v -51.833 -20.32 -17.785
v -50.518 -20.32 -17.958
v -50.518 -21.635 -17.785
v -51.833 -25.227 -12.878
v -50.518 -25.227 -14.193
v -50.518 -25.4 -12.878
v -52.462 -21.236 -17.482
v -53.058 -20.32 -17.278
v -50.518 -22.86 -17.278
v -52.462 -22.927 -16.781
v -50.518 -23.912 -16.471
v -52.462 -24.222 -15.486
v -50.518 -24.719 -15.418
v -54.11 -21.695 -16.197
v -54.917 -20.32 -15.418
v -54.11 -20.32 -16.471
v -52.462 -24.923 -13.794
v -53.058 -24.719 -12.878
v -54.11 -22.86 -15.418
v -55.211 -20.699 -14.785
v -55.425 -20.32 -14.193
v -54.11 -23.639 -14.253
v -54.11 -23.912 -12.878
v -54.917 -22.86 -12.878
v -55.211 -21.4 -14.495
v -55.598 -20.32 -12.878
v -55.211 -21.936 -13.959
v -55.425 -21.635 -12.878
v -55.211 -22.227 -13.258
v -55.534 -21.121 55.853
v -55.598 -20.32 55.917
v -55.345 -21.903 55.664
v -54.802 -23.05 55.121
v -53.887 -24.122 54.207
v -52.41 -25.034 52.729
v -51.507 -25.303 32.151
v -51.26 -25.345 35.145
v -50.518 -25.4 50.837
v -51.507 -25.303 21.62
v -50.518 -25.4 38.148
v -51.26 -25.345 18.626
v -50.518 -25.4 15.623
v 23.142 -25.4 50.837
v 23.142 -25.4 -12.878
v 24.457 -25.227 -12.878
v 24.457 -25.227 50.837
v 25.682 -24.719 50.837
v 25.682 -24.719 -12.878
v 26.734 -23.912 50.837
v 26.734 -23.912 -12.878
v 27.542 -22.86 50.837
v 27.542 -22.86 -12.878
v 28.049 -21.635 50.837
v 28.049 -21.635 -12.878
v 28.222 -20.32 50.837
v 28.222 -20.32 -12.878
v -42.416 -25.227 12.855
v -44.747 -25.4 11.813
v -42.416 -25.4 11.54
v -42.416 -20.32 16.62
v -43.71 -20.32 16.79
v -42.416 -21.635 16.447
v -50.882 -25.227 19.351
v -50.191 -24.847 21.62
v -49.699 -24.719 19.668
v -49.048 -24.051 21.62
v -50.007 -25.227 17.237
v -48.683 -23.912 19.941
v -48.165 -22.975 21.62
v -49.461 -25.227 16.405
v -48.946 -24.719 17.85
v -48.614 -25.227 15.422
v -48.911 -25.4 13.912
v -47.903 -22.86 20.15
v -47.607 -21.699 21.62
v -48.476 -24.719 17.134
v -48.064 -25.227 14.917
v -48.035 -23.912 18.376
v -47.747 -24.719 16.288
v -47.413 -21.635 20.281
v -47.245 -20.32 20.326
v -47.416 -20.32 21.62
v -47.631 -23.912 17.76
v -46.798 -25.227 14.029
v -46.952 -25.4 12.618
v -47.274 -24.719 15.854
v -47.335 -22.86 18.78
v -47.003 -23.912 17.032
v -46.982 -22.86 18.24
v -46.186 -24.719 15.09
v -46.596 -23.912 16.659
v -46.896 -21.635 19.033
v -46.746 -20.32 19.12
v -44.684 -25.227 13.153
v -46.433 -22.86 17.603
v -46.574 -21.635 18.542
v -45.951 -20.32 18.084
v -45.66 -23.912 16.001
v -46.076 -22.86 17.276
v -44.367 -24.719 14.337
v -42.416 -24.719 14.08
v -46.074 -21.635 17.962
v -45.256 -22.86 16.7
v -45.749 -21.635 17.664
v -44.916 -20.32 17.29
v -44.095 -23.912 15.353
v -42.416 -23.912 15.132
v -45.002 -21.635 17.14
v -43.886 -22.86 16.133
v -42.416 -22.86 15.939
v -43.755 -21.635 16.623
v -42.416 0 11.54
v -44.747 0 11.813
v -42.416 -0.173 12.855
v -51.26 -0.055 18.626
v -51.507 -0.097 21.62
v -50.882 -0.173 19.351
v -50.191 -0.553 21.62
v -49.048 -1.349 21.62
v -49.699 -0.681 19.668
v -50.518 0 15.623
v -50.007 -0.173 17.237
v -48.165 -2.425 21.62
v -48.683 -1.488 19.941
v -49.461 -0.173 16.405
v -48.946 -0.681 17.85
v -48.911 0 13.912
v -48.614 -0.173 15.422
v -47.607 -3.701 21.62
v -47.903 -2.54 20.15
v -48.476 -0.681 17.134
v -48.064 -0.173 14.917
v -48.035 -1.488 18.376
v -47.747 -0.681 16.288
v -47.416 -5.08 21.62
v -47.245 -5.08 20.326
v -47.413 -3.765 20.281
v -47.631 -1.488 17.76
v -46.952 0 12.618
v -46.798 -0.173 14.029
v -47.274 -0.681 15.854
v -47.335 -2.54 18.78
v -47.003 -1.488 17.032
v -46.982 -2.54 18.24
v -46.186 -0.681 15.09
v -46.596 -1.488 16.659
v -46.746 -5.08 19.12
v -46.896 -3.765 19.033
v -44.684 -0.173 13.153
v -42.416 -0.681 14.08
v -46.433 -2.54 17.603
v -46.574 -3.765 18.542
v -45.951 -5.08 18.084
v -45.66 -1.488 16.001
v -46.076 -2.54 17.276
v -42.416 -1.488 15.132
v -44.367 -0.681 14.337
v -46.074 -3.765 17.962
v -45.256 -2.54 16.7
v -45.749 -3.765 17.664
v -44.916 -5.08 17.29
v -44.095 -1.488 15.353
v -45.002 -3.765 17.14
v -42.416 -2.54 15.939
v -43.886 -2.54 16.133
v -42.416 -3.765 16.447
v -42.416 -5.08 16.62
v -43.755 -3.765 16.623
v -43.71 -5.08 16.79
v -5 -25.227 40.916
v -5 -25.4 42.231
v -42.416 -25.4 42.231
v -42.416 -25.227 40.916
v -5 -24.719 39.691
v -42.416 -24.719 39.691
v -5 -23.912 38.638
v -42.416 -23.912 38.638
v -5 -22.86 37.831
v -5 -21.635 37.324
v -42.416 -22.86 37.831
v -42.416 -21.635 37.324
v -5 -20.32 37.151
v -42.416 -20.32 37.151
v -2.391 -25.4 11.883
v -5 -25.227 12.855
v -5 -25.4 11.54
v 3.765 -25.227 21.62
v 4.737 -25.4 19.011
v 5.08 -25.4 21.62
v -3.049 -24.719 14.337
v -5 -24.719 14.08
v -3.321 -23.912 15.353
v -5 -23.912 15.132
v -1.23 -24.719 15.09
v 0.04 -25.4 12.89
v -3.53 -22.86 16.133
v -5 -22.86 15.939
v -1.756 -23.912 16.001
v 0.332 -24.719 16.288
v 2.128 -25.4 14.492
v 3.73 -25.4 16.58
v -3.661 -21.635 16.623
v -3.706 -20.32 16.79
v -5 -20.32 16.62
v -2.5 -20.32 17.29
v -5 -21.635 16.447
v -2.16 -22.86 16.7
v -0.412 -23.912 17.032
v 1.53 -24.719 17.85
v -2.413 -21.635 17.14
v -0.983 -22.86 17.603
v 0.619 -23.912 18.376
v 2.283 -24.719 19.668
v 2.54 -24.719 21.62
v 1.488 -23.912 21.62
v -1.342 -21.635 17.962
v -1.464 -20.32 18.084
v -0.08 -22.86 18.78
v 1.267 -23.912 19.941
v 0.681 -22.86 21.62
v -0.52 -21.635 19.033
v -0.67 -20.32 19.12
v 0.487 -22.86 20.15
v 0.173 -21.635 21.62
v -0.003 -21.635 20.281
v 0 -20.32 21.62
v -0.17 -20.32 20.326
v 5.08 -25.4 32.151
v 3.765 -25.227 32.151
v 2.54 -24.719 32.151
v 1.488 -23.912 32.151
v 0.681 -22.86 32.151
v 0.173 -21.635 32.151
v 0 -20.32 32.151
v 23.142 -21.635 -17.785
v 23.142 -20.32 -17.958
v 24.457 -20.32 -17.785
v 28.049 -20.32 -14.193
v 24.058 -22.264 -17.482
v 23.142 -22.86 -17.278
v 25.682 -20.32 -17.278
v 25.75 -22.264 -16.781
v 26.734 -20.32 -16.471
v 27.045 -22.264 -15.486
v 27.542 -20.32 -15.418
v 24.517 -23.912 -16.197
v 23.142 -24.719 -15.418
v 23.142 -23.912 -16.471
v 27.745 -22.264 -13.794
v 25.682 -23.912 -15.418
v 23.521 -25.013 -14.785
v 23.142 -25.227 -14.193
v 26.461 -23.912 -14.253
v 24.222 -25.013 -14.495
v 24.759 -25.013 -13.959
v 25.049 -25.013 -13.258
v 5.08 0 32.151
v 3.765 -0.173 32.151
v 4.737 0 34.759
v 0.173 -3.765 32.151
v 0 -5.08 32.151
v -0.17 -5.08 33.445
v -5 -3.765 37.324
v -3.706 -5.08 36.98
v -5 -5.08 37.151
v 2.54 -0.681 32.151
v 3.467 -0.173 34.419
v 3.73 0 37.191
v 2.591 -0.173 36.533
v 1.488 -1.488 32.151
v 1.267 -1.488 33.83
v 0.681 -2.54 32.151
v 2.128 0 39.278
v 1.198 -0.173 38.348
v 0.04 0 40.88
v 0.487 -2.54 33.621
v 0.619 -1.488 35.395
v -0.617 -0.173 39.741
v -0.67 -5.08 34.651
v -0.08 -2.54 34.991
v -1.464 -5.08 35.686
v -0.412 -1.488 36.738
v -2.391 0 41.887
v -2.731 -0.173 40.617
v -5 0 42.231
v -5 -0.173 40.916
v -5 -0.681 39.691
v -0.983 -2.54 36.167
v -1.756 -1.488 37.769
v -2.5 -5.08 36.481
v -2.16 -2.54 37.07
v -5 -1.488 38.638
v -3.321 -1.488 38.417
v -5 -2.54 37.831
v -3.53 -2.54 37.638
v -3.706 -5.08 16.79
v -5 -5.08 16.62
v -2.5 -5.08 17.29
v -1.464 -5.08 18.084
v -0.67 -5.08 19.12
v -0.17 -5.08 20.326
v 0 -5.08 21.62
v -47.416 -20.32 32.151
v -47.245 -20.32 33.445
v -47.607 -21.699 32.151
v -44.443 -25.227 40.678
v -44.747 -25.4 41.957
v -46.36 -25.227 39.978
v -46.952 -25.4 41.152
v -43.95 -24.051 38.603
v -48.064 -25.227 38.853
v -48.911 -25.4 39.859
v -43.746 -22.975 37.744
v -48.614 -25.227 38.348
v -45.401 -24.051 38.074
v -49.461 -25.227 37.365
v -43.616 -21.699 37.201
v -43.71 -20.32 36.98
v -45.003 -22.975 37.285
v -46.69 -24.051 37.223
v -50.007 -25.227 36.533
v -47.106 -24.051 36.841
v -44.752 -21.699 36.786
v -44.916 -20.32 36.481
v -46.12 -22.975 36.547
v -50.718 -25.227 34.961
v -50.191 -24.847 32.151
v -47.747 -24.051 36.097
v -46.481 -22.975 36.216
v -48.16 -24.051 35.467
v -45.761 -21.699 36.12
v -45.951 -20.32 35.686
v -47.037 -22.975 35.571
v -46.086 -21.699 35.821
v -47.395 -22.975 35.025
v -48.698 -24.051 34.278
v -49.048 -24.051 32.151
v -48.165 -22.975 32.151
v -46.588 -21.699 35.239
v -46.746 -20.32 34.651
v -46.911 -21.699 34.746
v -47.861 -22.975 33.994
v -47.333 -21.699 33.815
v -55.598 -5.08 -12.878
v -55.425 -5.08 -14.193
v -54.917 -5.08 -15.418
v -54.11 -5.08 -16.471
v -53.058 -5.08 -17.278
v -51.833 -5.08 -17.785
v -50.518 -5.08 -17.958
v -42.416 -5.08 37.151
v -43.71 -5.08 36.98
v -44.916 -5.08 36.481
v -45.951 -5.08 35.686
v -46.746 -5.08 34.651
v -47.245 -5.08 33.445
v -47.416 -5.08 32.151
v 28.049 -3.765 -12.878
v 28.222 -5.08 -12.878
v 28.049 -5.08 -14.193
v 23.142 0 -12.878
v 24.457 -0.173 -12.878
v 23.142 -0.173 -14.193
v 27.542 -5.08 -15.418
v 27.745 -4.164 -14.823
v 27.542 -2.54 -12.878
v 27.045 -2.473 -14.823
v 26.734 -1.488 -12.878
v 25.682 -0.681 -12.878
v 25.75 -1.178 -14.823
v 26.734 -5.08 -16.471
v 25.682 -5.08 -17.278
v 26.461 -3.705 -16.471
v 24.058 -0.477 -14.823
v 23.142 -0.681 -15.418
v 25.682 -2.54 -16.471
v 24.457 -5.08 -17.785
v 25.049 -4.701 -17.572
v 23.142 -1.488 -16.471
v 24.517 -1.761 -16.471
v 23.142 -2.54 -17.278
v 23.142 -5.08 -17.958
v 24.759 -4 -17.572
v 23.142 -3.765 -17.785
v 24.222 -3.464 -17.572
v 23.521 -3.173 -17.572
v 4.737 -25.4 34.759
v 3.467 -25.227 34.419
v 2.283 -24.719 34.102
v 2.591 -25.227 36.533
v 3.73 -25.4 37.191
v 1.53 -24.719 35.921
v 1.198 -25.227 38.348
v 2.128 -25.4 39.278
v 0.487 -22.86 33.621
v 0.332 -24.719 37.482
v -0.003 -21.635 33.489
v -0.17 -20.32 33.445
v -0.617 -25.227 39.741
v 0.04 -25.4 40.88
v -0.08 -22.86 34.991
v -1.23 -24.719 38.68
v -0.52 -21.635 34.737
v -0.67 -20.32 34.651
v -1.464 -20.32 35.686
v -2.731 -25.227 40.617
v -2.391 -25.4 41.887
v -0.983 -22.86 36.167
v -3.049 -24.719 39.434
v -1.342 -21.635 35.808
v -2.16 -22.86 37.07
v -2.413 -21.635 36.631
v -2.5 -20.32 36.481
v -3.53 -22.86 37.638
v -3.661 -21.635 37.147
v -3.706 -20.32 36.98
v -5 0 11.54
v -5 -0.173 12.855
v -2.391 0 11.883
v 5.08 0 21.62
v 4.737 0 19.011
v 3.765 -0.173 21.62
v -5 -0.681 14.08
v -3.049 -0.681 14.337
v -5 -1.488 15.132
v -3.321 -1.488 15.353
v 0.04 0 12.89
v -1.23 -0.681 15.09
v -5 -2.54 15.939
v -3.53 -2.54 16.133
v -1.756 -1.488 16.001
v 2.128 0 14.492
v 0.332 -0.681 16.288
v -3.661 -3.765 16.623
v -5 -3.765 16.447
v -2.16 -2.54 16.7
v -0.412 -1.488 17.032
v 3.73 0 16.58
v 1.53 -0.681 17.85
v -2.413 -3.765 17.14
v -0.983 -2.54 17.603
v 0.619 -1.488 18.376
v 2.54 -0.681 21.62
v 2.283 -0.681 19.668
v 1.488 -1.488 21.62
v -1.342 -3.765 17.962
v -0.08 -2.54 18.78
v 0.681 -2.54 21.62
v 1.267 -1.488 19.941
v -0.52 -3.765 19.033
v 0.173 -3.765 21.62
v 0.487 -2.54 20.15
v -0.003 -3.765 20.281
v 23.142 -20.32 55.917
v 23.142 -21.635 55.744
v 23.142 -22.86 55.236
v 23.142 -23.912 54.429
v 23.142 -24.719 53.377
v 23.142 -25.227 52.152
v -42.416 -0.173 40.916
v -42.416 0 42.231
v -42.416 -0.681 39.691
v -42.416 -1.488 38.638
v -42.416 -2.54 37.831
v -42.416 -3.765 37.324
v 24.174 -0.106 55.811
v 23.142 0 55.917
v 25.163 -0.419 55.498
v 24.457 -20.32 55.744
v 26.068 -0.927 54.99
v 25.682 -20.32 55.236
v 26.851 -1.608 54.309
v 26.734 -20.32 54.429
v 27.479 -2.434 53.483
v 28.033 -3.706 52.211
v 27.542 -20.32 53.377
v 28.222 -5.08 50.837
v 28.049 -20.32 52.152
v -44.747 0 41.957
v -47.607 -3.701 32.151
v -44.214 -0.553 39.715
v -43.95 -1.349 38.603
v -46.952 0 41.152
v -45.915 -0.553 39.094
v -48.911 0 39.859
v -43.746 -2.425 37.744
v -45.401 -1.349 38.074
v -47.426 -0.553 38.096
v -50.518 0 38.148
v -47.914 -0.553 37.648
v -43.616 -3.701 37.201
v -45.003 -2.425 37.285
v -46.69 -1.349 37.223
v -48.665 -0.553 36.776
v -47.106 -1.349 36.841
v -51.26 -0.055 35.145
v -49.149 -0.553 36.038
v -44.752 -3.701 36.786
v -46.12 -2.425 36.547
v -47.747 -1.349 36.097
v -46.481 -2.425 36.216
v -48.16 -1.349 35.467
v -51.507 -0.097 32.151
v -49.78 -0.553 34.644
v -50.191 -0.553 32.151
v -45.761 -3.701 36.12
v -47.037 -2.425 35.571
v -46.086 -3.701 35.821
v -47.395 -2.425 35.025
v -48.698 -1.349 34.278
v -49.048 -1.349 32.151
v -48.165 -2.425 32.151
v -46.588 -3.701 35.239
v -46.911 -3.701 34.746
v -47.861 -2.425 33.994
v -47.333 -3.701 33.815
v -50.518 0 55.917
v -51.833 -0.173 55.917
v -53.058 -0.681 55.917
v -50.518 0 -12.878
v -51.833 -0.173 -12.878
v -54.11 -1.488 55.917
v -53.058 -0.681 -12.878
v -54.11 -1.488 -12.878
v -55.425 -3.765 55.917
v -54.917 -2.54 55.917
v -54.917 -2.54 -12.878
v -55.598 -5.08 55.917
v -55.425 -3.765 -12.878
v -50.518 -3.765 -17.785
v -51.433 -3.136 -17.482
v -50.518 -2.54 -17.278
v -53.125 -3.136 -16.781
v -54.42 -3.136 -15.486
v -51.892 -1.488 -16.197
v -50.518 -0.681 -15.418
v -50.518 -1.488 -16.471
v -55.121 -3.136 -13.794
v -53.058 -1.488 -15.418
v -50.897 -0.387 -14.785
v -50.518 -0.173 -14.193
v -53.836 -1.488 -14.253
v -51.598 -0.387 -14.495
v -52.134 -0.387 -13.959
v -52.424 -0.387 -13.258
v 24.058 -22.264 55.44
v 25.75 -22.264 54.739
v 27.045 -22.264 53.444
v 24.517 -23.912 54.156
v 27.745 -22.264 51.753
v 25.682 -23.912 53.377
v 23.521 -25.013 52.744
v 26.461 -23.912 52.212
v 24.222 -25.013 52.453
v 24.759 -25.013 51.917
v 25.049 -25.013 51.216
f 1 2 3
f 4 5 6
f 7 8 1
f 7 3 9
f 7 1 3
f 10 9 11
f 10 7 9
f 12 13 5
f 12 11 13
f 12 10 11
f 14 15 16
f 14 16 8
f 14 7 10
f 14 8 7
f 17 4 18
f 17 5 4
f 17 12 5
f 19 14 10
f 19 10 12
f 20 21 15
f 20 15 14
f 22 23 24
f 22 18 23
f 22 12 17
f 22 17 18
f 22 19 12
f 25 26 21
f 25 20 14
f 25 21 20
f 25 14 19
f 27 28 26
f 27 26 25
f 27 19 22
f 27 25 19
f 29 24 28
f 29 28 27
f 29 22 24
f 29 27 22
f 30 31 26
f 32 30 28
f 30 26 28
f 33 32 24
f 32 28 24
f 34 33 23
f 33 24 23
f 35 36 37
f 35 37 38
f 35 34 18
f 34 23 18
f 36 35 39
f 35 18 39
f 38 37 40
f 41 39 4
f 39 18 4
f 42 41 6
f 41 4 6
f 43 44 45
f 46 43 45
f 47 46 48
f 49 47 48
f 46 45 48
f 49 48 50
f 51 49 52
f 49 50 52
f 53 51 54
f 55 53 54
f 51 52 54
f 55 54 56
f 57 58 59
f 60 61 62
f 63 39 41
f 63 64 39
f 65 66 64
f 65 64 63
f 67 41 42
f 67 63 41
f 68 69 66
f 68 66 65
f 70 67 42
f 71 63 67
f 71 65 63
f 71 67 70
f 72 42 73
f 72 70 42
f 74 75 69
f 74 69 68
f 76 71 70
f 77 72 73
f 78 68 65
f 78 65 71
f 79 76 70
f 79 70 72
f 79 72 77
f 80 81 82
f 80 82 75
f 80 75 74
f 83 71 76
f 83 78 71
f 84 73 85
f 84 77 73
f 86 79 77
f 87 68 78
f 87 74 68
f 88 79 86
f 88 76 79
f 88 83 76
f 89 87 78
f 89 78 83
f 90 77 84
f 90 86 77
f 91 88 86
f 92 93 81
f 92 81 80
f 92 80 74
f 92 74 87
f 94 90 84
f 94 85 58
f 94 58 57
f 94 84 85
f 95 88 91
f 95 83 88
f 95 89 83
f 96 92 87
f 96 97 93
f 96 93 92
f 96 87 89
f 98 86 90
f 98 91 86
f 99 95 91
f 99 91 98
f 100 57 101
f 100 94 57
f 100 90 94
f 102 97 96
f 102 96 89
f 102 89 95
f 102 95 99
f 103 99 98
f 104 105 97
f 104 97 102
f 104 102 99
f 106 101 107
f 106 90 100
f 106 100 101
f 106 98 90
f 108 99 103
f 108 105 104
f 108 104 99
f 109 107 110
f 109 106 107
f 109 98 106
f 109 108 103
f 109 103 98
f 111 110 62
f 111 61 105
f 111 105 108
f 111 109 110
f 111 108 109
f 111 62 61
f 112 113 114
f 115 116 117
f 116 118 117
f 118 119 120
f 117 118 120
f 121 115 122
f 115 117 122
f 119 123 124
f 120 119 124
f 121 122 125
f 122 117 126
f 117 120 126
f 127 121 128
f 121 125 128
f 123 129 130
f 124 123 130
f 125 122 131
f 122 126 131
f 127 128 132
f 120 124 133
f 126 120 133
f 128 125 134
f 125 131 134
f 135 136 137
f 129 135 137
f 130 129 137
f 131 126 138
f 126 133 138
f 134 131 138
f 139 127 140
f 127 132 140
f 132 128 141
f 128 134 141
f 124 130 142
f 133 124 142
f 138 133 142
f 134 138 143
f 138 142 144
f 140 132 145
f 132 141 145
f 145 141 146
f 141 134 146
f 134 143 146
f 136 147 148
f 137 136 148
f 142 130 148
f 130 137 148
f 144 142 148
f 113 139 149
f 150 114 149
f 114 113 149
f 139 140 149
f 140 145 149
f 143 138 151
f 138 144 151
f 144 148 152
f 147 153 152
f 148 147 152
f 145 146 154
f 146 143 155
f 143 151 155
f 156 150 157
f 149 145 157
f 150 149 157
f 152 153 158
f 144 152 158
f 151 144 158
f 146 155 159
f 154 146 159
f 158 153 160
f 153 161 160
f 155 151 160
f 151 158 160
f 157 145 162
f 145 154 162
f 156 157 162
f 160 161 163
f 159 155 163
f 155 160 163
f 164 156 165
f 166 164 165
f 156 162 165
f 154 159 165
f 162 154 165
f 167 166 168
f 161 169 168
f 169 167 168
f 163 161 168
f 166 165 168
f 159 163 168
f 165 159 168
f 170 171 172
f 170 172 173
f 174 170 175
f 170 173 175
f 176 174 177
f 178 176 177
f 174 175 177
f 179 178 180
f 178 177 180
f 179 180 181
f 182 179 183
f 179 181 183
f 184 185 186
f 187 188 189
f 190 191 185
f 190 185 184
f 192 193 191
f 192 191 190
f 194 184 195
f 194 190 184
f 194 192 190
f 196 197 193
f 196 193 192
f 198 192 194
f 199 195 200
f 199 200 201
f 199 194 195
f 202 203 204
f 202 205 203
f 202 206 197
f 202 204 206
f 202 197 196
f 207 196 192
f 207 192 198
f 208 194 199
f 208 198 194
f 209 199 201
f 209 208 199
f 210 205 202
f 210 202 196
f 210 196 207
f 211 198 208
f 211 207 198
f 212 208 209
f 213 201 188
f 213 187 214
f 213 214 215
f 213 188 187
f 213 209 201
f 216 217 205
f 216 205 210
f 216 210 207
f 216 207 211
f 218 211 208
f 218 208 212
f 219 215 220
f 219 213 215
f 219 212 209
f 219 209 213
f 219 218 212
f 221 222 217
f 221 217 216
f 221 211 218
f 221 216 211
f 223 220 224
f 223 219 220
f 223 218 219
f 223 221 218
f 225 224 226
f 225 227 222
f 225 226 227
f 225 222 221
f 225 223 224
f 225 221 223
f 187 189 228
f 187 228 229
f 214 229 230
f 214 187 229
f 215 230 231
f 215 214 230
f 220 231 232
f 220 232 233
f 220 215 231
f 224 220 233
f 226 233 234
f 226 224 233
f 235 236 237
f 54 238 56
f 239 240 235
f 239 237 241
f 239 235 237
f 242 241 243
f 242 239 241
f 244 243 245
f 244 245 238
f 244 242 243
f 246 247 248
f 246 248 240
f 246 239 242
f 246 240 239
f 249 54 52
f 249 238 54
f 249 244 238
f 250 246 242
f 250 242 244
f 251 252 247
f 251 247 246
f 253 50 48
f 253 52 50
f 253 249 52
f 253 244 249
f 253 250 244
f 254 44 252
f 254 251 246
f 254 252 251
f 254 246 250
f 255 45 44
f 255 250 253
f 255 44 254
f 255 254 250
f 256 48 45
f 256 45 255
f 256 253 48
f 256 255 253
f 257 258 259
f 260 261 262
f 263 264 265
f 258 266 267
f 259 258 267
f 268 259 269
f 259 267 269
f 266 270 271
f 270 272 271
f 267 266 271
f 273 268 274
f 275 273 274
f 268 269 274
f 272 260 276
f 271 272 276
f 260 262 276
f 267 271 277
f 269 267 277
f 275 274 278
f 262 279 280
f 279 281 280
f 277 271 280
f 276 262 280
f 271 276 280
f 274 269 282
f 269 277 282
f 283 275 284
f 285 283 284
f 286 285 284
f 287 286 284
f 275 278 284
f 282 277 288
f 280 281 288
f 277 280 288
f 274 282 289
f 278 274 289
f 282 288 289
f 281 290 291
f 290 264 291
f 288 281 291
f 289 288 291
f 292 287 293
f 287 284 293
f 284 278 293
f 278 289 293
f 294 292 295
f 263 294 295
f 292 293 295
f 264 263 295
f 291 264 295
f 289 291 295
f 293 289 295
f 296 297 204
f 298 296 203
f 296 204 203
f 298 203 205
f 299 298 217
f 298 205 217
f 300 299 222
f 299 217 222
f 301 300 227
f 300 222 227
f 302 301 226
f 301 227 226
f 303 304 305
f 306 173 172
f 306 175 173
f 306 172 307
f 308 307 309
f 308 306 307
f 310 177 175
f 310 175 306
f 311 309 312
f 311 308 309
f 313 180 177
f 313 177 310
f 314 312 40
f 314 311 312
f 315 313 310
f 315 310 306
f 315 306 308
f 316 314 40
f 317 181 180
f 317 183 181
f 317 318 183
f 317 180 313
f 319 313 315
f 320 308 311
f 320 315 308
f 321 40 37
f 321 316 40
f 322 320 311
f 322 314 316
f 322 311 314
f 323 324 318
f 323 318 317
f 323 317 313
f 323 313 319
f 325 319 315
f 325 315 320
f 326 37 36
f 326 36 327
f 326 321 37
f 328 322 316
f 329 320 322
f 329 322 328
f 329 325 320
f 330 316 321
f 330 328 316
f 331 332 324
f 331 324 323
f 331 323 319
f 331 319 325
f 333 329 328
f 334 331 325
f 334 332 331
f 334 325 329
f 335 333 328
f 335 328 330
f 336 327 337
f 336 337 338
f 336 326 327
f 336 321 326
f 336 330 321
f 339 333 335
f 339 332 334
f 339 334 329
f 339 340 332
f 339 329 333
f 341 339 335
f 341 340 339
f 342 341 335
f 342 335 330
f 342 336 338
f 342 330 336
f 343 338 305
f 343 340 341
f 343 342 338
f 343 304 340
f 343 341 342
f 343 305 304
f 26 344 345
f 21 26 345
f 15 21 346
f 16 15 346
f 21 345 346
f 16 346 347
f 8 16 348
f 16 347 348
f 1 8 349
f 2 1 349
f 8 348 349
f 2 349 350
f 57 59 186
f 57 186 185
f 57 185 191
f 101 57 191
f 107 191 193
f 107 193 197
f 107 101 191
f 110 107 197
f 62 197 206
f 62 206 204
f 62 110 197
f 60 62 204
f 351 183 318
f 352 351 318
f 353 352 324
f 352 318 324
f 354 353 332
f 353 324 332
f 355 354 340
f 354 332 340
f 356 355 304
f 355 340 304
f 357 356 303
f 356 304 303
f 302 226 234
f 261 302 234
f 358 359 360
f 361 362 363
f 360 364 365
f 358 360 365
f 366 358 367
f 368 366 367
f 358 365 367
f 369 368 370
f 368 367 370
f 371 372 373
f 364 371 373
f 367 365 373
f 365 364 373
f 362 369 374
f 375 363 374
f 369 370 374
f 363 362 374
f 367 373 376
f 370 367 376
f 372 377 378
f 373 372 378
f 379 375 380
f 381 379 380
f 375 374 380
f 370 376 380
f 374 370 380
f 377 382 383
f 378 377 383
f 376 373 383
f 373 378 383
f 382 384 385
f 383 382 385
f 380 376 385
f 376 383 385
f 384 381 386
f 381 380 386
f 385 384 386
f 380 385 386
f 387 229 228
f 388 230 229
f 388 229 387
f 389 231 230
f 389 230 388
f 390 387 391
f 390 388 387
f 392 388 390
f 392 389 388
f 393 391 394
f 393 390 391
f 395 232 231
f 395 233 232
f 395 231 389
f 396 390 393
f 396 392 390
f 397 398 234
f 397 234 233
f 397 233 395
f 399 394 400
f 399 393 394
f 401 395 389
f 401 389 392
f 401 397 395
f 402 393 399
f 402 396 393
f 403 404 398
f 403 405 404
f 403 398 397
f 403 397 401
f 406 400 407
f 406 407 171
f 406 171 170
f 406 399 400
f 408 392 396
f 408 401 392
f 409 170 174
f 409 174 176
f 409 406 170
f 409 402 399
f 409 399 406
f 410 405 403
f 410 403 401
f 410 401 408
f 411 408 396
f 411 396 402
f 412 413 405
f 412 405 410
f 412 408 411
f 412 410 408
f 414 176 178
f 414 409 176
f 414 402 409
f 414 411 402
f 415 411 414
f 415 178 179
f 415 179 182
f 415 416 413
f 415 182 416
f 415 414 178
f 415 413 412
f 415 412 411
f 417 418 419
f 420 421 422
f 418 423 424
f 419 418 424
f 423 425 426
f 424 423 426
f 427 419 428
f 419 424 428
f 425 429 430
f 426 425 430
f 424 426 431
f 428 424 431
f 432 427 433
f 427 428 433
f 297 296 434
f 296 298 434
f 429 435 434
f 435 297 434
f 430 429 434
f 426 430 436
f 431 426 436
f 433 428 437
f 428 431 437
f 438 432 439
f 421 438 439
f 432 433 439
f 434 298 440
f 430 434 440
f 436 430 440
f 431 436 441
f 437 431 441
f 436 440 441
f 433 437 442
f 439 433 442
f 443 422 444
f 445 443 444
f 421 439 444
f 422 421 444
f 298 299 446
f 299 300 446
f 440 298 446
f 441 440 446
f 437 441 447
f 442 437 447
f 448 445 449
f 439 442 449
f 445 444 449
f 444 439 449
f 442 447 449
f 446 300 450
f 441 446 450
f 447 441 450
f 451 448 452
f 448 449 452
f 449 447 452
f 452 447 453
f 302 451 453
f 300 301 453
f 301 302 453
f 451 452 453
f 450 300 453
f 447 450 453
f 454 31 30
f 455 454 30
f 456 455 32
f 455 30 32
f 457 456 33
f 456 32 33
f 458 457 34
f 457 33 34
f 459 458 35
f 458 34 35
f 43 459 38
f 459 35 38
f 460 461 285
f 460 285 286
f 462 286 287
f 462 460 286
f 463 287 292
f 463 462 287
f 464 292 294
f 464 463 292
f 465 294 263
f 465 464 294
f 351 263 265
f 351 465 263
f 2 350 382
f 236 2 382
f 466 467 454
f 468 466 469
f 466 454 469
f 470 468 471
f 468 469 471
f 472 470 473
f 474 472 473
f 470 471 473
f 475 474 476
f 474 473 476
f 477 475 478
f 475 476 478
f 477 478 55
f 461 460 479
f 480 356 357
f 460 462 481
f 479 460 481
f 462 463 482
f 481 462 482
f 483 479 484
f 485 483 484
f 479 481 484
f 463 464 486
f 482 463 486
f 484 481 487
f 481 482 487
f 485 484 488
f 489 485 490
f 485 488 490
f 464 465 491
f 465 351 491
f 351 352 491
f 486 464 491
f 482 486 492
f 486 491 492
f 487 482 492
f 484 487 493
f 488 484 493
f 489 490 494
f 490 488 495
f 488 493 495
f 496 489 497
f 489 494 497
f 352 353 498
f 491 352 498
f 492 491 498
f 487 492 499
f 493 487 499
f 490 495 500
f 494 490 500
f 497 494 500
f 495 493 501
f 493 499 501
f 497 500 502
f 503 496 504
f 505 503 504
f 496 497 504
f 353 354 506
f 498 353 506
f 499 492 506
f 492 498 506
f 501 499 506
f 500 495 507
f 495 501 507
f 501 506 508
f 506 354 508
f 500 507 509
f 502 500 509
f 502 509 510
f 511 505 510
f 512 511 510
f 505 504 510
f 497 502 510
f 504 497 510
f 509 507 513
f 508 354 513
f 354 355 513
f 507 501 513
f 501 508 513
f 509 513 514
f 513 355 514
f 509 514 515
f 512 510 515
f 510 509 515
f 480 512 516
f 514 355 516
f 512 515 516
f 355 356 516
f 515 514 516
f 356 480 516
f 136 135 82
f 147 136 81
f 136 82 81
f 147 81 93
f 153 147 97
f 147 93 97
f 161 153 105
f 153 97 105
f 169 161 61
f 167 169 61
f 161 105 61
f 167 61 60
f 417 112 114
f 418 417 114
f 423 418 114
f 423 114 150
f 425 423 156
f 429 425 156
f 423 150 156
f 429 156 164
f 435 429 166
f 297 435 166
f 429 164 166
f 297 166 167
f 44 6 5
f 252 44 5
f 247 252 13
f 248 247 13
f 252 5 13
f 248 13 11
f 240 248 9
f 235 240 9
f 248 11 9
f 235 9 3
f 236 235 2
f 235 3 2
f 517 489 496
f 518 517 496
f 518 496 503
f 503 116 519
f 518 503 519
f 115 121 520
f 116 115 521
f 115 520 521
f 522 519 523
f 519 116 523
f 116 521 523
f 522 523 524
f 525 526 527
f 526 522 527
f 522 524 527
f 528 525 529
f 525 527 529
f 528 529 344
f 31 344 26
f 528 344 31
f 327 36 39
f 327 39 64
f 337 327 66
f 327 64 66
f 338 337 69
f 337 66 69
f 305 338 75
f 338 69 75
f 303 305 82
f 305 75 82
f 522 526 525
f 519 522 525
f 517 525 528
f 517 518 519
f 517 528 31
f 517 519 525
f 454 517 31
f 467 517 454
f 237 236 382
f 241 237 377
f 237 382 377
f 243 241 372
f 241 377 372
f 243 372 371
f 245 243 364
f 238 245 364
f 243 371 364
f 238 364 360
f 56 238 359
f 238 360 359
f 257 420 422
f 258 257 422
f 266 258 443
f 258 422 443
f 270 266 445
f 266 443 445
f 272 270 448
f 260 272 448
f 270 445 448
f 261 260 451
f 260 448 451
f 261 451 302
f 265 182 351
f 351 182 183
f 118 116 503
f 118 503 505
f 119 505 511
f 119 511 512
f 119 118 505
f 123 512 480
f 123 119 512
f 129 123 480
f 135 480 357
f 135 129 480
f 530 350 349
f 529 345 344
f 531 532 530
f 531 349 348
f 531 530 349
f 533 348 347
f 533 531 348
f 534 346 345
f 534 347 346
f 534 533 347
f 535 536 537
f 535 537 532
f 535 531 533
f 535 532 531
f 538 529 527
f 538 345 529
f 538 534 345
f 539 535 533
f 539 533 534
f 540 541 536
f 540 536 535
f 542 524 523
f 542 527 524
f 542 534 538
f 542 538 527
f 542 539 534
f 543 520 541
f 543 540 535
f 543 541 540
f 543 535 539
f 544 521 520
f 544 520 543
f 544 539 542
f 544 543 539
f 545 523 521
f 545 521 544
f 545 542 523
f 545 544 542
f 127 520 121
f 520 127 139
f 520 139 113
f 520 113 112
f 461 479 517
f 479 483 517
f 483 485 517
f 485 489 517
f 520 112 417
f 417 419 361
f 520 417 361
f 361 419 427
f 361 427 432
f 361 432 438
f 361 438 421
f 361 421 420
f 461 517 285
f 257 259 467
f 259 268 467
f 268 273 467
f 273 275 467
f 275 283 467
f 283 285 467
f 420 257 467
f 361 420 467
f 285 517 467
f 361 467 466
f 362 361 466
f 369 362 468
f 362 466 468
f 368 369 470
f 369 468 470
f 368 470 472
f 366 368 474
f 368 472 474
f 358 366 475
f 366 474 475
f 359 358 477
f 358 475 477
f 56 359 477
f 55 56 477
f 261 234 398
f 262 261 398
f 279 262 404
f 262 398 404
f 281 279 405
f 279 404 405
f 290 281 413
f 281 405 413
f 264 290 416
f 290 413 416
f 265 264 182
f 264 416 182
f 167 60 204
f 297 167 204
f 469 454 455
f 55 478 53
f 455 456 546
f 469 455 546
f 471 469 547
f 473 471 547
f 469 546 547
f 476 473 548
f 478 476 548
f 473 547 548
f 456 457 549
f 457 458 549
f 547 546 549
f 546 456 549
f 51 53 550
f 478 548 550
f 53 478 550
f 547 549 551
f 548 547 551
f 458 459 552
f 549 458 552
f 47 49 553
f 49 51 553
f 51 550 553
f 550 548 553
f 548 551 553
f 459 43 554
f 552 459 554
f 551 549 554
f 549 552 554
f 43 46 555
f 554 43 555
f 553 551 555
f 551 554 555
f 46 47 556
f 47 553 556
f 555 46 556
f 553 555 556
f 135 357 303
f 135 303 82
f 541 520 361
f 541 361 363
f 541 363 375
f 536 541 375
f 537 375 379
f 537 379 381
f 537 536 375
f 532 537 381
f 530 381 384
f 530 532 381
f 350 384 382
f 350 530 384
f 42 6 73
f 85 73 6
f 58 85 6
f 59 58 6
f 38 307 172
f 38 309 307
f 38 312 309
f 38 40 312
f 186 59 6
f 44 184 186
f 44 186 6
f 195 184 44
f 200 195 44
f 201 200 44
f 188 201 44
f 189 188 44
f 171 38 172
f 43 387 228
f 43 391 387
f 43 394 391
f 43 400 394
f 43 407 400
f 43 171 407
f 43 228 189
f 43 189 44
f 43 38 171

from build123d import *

# Parameters (mm, degrees)
F0_W         = 83.8200002909
F0_H         = 73.8754719496
F1_DEPTH     = 25.4
F3_DEPTH     = 25.4
F4_R         = 5.08
F5_T1_DEPTH  = 63.7154719496
F5_T3_DEPTH  = 73.6600002909
F5_T5_DEPTH  = 81.4954719496
F5_T7_DEPTH  = 37.4158525467
F5_T9_DEPTH  = 15.24
F5_T11_DEPTH = 10.5305814743
F5_T13_DEPTH = 91.4400002909
F5_S17_W     = 5.08
F5_S17_H     = 5.08
F5_T18_DEPTH = 5.08
F5_S23_W     = 5.08
F5_S23_H     = 5.08
F5_T24_DEPTH = 5.08
F5_S29_W     = 5.08
F5_S29_H     = 5.08
F5_T30_DEPTH = 5.08
F5_T34_ANGLE = 90
F5_T36_ANGLE = 90
F5_T38_ANGLE = 90
F5_T40_ANGLE = 90
F5_T42_ANGLE = 90
F5_T44_ANGLE = 90
F5_T46_ANGLE = 90
F5_T48_ANGLE = 90
F5_T50_ANGLE = 90
F5_T52_ANGLE = 90


# Not quite as in the source:
# - a fillet or chamfer that OpenCascade refuses, or shapes differently, is made with other operations: its cross-section is extruded or revolved along the edge and cut away or added
# - a feature names something its author has since deleted; it is built from what else it names


with BuildPart() as f1:
    # F0 (on Front) → F1 (new body)
    with BuildSketch(Plane.XZ):
        with Locations((-13.6877670884, 18.9792513847)):
            Rectangle(F0_W, F0_H)
    extrude(amount=F1_DEPTH)

    # F2 (on face) → F3 (cut)
    with BuildSketch(Plane.XZ.offset(25.4)):
        with BuildLine():
            ThreePointArc((0, 32.1505618095), (-1.4644660941, 35.6860957155), (-5, 37.1505618095))
            Line((-5, 37.1505618095), (-42.4158525467, 37.1505618095))
            ThreePointArc((-42.4158525467, 37.1505618095), (-45.9513864526, 35.6860957155), (-47.4158525467, 32.1505618095))
            Line((-47.4158525467, 32.1505618095), (-47.4158525467, 21.6199803352))
            ThreePointArc((-47.4158525467, 21.6199803352), (-45.9513864526, 18.0844464293), (-42.4158525467, 16.6199803352))
            Line((-42.4158525467, 16.6199803352), (-5, 16.6199803352))
            ThreePointArc((-5, 16.6199803352), (-1.4644660941, 18.0844464293), (0, 21.6199803352))
            Line((0, 21.6199803352), (0, 32.1505618095))
        make_face()
    extrude(amount=-F3_DEPTH, mode=Mode.SUBTRACT)

    # F4
    f4_edges = [f1.edges().sort_by_distance(p)[0] for p in [
        (28.222233, 0, 18.979251),
        (28.222233, -12.7, 55.916987),
    ]]
    fillet(f4_edges, radius=F4_R)

    # F5: fillet of radius 5.08 on 10 edges, made by hand

    # F5_s2 → F5_t1 (cut)
    with BuildSketch(Plane.XY.offset(-12.8784845901)):
        with BuildLine():
            ThreePointArc((23.142233057, -25.4), (26.7343355054, -23.9121024484), (28.222233057, -20.32))
            Line((28.222233057, -20.32), (28.222233057, -25.4))
            Line((28.222233057, -25.4), (23.142233057, -25.4))
        make_face()
    extrude(amount=F5_T1_DEPTH, mode=Mode.SUBTRACT)

    # F5_s4 → F5_t3 (cut)
    with BuildSketch(Plane.YZ.offset(-50.5177672338)):
        with BuildLine():
            ThreePointArc((-25.4, -12.8784845901), (-23.9121024484, -16.4705870385), (-20.32, -17.9584845901))
            Line((-20.32, -17.9584845901), (-25.4, -17.9584845901))
            Line((-25.4, -17.9584845901), (-25.4, -12.8784845901))
        make_face()
        with BuildLine():
            ThreePointArc((0, -12.8784845901), (-1.4878975516, -16.4705870385), (-5.08, -17.9584845901))
            Line((-5.08, -17.9584845901), (0, -17.9584845901))
            Line((0, -17.9584845901), (0, -12.8784845901))
        make_face()
    extrude(amount=F5_T3_DEPTH, mode=Mode.SUBTRACT)

    # F5_s6 → F5_t5 (cut)
    with BuildSketch(Plane.XY.offset(-12.8784845901)):
        with BuildLine():
            ThreePointArc((-55.5977672338, -20.32), (-54.1098696823, -23.9121024484), (-50.5177672338, -25.4))
            Line((-50.5177672338, -25.4), (-55.5977672338, -25.4))
            Line((-55.5977672338, -25.4), (-55.5977672338, -20.32))
        make_face()
        with BuildLine():
            ThreePointArc((-50.5177672338, 0), (-54.1098696823, -1.4878975516), (-55.5977672338, -5.08))
            Line((-55.5977672338, -5.08), (-55.5977672338, 0))
            Line((-55.5977672338, 0), (-50.5177672338, 0))
        make_face()
    extrude(amount=F5_T5_DEPTH, mode=Mode.SUBTRACT)

    # F5_s8 → F5_t7 (cut)
    with BuildSketch(Plane.YZ.offset(-42.4158525467)):
        with BuildLine():
            ThreePointArc((-25.4, 42.2305618095), (-23.9121024484, 38.6384593611), (-20.32, 37.1505618095))
            Line((-20.32, 37.1505618095), (-25.4, 37.1505618095))
            Line((-25.4, 37.1505618095), (-25.4, 42.2305618095))
        make_face()
        with BuildLine():
            ThreePointArc((0, 11.5399803352), (-1.4878975516, 15.1320827837), (-5.08, 16.6199803352))
            Line((-5.08, 16.6199803352), (0, 16.6199803352))
            Line((0, 16.6199803352), (0, 11.5399803352))
        make_face()
        with BuildLine():
            ThreePointArc((0, 42.2305618095), (-1.4878975516, 38.6384593611), (-5.08, 37.1505618095))
            Line((-5.08, 37.1505618095), (0, 37.1505618095))
            Line((0, 37.1505618095), (0, 42.2305618095))
        make_face()
        with BuildLine():
            ThreePointArc((-25.4, 11.5399803352), (-23.9121024484, 15.1320827837), (-20.32, 16.6199803352))
            Line((-20.32, 16.6199803352), (-25.4, 16.6199803352))
            Line((-25.4, 16.6199803352), (-25.4, 11.5399803352))
        make_face()
    extrude(amount=F5_T7_DEPTH, mode=Mode.SUBTRACT)

    # F5_s10 → F5_t9 (cut)
    with BuildSketch(Plane.XZ.offset(5.08)):
        with BuildLine():
            ThreePointArc((-55.5977672338, -12.8784845901), (-54.1098696823, -16.4705870385), (-50.5177672338, -17.9584845901))
            Line((-50.5177672338, -17.9584845901), (-55.5977672338, -17.9584845901))
            Line((-55.5977672338, -17.9584845901), (-55.5977672338, -12.8784845901))
        make_face()
        with BuildLine():
            ThreePointArc((23.142233057, -17.9584845901), (26.7343355054, -16.4705870385), (28.222233057, -12.8784845901))
            Line((28.222233057, -12.8784845901), (28.222233057, -17.9584845901))
            Line((28.222233057, -17.9584845901), (23.142233057, -17.9584845901))
        make_face()
    extrude(amount=F5_T9_DEPTH, mode=Mode.SUBTRACT)

    # F5_s12 → F5_t11 (cut)
    with BuildSketch(Plane.XY.offset(21.6199803352)):
        with BuildLine():
            ThreePointArc((-52.4958525467, 0), (-48.9037500983, -1.4878975516), (-47.4158525467, -5.08))
            Line((-47.4158525467, -5.08), (-47.4158525467, 0))
            Line((-47.4158525467, 0), (-52.4958525467, 0))
        make_face()
        with BuildLine():
            ThreePointArc((5.08, 0), (1.4878975516, -1.4878975516), (0, -5.08))
            Line((0, -5.08), (0, 0))
            Line((0, 0), (5.08, 0))
        make_face()
        with BuildLine():
            ThreePointArc((5.08, -25.4), (1.4878975516, -23.9121024484), (0, -20.32))
            Line((0, -20.32), (0, -25.4))
            Line((0, -25.4), (5.08, -25.4))
        make_face()
        with BuildLine():
            ThreePointArc((-52.4958525467, -25.4), (-48.9037500983, -23.9121024484), (-47.4158525467, -20.32))
            Line((-47.4158525467, -20.32), (-47.4158525467, -25.4))
            Line((-47.4158525467, -25.4), (-52.4958525467, -25.4))
        make_face()
    extrude(amount=F5_T11_DEPTH, mode=Mode.SUBTRACT)

    # F5_s14 → F5_t13 (cut)
    with BuildSketch(Plane.YZ.offset(-68.2977672338)):
        with BuildLine():
            ThreePointArc((-20.32, 55.9169873595), (-23.9121024484, 54.429089808), (-25.4, 50.8369873595))
            Line((-25.4, 50.8369873595), (-25.4, 55.9169873595))
            Line((-25.4, 55.9169873595), (-20.32, 55.9169873595))
        make_face()
    extrude(amount=F5_T13_DEPTH, mode=Mode.SUBTRACT)


with BuildPart() as f5_tool16:
    # F5_s17 → F5_t18 (new body)
    with BuildSketch(Plane.XZ.offset(20.32)):
        with Locations((25.682233057, -15.4184845901)):
            Rectangle(F5_S17_W, F5_S17_H)
    extrude(amount=F5_T18_DEPTH)

    # F5_s19 → F5_t20 (revolve, cut)
    with BuildSketch(Plane(origin=(23.142233057, -20.32, -12.8784845901), x_dir=(-0.7071067812, 0, 0.7071067812), z_dir=(0.7071067812, 0, 0.7071067812))):
        with BuildLine():
            ThreePointArc((0, -5.08), (5.08, 0), (0, 5.08))
            Line((0, 5.08), (0, -5.08))
        make_face()
    revolve(axis=Axis((23.142233057, -20.32, -12.8784845901), (0, -1, 0)), mode=Mode.SUBTRACT)


with BuildPart() as f1_1:
    add(f1.part)

    # F5_t15: cut F5_tool16
    add(f5_tool16.part, mode=Mode.SUBTRACT)


with BuildPart() as f5_tool22:
    # F5_s23 → F5_t24 (new body)
    with BuildSketch(Plane.YZ.offset(-50.5177672338)):
        with Locations((-22.86, -15.4184845901)):
            Rectangle(F5_S23_W, F5_S23_H)
    extrude(amount=-F5_T24_DEPTH)

    # F5_s25 → F5_t26 (revolve, cut)
    with BuildSketch(Plane(origin=(-50.5177672338, -20.32, -12.8784845901), x_dir=(0, 0.7071067812, 0.7071067812), z_dir=(0, -0.7071067812, 0.7071067812))):
        with BuildLine():
            ThreePointArc((0, -5.08), (5.08, 0), (0, 5.08))
            Line((0, 5.08), (0, -5.08))
        make_face()
    revolve(axis=Axis((-50.5177672338, -20.32, -12.8784845901), (-1, 0, 0)), mode=Mode.SUBTRACT)


with BuildPart() as f1_2:
    add(f1_1.part)

    # F5_t21: cut F5_tool22
    add(f5_tool22.part, mode=Mode.SUBTRACT)


with BuildPart() as f5_tool28:
    # F5_s29 → F5_t30 (new body)
    with BuildSketch(Plane.XZ.offset(5.08)):
        with Locations((-53.0577672338, -15.4184845901)):
            Rectangle(F5_S29_W, F5_S29_H)
    extrude(amount=-F5_T30_DEPTH)

    # F5_s31 → F5_t32 (revolve, cut)
    with BuildSketch(Plane(origin=(-50.5177672338, -5.08, -12.8784845901), x_dir=(0.7071067812, 0, 0.7071067812), z_dir=(-0.7071067812, 0, 0.7071067812))):
        with BuildLine():
            ThreePointArc((0, -5.08), (5.08, 0), (0, 5.08))
            Line((0, 5.08), (0, -5.08))
        make_face()
    revolve(axis=Axis((-50.5177672338, -5.08, -12.8784845901), (0, 1, 0)), mode=Mode.SUBTRACT)


with BuildPart() as f1_3:
    add(f1_2.part)

    # F5_t27: cut F5_tool28
    add(f5_tool28.part, mode=Mode.SUBTRACT)

    # F5_s33 → F5_t34 (revolve, cut)
    with BuildSketch(Plane.XY.offset(32.1505618095)):
        with BuildLine():
            ThreePointArc((5.08, -25.4), (1.4878975516, -23.9121024484), (0, -20.32))
            Line((0, -20.32), (0, -25.4))
            Line((0, -25.4), (5.08, -25.4))
        make_face()
    revolve(axis=Axis((-5, -25.4, 32.1505618095), (0, -1, 0)), revolution_arc=F5_T34_ANGLE, mode=Mode.SUBTRACT)

    # F5_s35 → F5_t36 (revolve, cut)
    with BuildSketch(Plane.XY.offset(21.6199803352)):
        with BuildLine():
            ThreePointArc((-52.4958525467, 0), (-48.9037500983, -1.4878975516), (-47.4158525467, -5.08))
            Line((-47.4158525467, -5.08), (-47.4158525467, 0))
            Line((-47.4158525467, 0), (-52.4958525467, 0))
        make_face()
    revolve(axis=Axis((-42.4158525467, 0, 21.6199803352), (0, -1, 0)), revolution_arc=F5_T36_ANGLE, mode=Mode.SUBTRACT)

    # F5_s37 → F5_t38 (revolve, cut)
    with BuildSketch(Plane.YZ.offset(-42.4158525467)):
        with BuildLine():
            ThreePointArc((0, 42.2305618095), (-1.4878975516, 38.6384593611), (-5.08, 37.1505618095))
            Line((-5.08, 37.1505618095), (0, 37.1505618095))
            Line((0, 37.1505618095), (0, 42.2305618095))
        make_face()
    revolve(axis=Axis((-42.4158525467, 0, 32.1505618095), (0, -1, 0)), revolution_arc=F5_T38_ANGLE, mode=Mode.SUBTRACT)

    # F5_s39 → F5_t40 (revolve, cut)
    with BuildSketch(Plane.XY.offset(32.1505618095)):
        with BuildLine():
            ThreePointArc((5.08, 0), (1.4878975516, -1.4878975516), (0, -5.08))
            Line((0, -5.08), (0, 0))
            Line((0, 0), (5.08, 0))
        make_face()
    revolve(axis=Axis((-5, 0, 32.1505618095), (0, -1, 0)), revolution_arc=F5_T40_ANGLE, mode=Mode.SUBTRACT)

    # F5_s41 → F5_t42 (revolve, cut)
    with BuildSketch(Plane.YZ.offset(-5)):
        with BuildLine():
            ThreePointArc((0, 11.5399803352), (-1.4878975516, 15.1320827837), (-5.08, 16.6199803352))
            Line((-5.08, 16.6199803352), (0, 16.6199803352))
            Line((0, 16.6199803352), (0, 11.5399803352))
        make_face()
    revolve(axis=Axis((-5, 0, 21.6199803352), (0, -1, 0)), revolution_arc=F5_T42_ANGLE, mode=Mode.SUBTRACT)

    # F5_s43 → F5_t44 (revolve, cut)
    with BuildSketch(Plane.XZ.offset(5.08)):
        with BuildLine():
            ThreePointArc((28.222233057, -12.8784845901), (26.7343355054, -16.4705870385), (23.142233057, -17.9584845901))
            Line((23.142233057, -17.9584845901), (28.222233057, -17.9584845901))
            Line((28.222233057, -17.9584845901), (28.222233057, -12.8784845901))
        make_face()
    revolve(axis=Axis((23.142233057, -5.08, -17.9584845901), (0, 0, 1)), revolution_arc=F5_T44_ANGLE, mode=Mode.SUBTRACT)

    # F5_s45 → F5_t46 (revolve, cut)
    with BuildSketch(Plane.YZ.offset(-5)):
        with BuildLine():
            ThreePointArc((-25.4, 11.5399803352), (-23.9121024484, 15.1320827837), (-20.32, 16.6199803352))
            Line((-20.32, 16.6199803352), (-25.4, 16.6199803352))
            Line((-25.4, 16.6199803352), (-25.4, 11.5399803352))
        make_face()
    revolve(axis=Axis((-5, -25.4, 21.6199803352), (0, -1, 0)), revolution_arc=F5_T46_ANGLE, mode=Mode.SUBTRACT)

    # F5_s47 → F5_t48 (revolve, cut)
    with BuildSketch(Plane.XY.offset(21.6199803352)):
        with BuildLine():
            ThreePointArc((-52.4958525467, -25.4), (-48.9037500983, -23.9121024484), (-47.4158525467, -20.32))
            Line((-47.4158525467, -20.32), (-47.4158525467, -25.4))
            Line((-47.4158525467, -25.4), (-52.4958525467, -25.4))
        make_face()
    revolve(axis=Axis((-42.4158525467, -25.4, 21.6199803352), (0, -1, 0)), revolution_arc=F5_T48_ANGLE, mode=Mode.SUBTRACT)

    # F5_s49 → F5_t50 (revolve, cut)
    with BuildSketch(Plane.YZ.offset(-42.4158525467)):
        with BuildLine():
            ThreePointArc((-25.4, 42.2305618095), (-23.9121024484, 38.6384593611), (-20.32, 37.1505618095))
            Line((-20.32, 37.1505618095), (-25.4, 37.1505618095))
            Line((-25.4, 37.1505618095), (-25.4, 42.2305618095))
        make_face()
    revolve(axis=Axis((-42.4158525467, -25.4, 32.1505618095), (0, -1, 0)), revolution_arc=F5_T50_ANGLE, mode=Mode.SUBTRACT)

    # F5_s51 → F5_t52 (revolve, cut)
    with BuildSketch(Plane.YZ.offset(23.142233057)):
        with BuildLine():
            ThreePointArc((-20.32, 55.9169873595), (-23.9121024484, 54.429089808), (-25.4, 50.8369873595))
            Line((-25.4, 50.8369873595), (-25.4, 55.9169873595))
            Line((-25.4, 55.9169873595), (-20.32, 55.9169873595))
        make_face()
    revolve(axis=Axis((23.142233057, -25.4, 50.8369873595), (0, 1, 0)), revolution_arc=F5_T52_ANGLE, mode=Mode.SUBTRACT)


solid = f1_3.part
